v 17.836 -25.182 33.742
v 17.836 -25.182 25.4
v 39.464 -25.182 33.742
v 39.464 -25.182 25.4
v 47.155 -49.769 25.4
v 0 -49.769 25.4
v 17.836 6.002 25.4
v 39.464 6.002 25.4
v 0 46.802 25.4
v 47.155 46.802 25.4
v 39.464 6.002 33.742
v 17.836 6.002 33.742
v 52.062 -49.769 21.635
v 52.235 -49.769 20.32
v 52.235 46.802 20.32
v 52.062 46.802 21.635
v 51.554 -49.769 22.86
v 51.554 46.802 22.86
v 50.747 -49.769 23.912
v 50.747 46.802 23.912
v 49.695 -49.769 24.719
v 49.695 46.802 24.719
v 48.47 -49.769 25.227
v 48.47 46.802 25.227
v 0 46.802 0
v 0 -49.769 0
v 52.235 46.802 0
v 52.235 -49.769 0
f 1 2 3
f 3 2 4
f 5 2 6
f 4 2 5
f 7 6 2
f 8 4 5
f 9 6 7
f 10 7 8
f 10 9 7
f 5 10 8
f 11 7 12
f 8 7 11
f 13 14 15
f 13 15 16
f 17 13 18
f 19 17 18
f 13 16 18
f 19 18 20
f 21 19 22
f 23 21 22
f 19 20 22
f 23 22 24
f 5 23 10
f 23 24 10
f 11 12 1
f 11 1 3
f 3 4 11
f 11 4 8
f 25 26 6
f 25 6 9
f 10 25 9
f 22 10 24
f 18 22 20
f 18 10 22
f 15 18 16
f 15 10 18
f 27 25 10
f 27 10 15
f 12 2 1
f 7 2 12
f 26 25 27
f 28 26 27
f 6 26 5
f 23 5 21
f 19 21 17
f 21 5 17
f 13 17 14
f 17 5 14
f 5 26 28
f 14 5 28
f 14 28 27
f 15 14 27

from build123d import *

# Parameters (mm, degrees)
F0_W     = 52.234799
F0_H     = 96.570488
F1_DEPTH = 25.4
F2_R     = 5.08
F3_W     = 21.627817
F3_H     = 31.183585
F4_DEPTH = 8.342061


with BuildPart() as f1:
    # F0 (on Top) → F1 (new body)
    with BuildSketch(Plane.XY):
        with Locations((26.117399, -1.483681)):
            Rectangle(F0_W, F0_H)
    extrude(amount=F1_DEPTH)

    # F2
    f2_edges = [f1.edges().sort_by_distance(p)[0] for p in [
        (52.234799, -1.483681, 25.4),
    ]]
    fillet(f2_edges, radius=F2_R)

    # F3 (on face) → F4 (join)
    with BuildSketch(Plane.XY.offset(25.4)):
        with Locations((28.650353, -9.590007)):
            Rectangle(F3_W, F3_H)
    extrude(amount=F4_DEPTH)


solid = f1.part
